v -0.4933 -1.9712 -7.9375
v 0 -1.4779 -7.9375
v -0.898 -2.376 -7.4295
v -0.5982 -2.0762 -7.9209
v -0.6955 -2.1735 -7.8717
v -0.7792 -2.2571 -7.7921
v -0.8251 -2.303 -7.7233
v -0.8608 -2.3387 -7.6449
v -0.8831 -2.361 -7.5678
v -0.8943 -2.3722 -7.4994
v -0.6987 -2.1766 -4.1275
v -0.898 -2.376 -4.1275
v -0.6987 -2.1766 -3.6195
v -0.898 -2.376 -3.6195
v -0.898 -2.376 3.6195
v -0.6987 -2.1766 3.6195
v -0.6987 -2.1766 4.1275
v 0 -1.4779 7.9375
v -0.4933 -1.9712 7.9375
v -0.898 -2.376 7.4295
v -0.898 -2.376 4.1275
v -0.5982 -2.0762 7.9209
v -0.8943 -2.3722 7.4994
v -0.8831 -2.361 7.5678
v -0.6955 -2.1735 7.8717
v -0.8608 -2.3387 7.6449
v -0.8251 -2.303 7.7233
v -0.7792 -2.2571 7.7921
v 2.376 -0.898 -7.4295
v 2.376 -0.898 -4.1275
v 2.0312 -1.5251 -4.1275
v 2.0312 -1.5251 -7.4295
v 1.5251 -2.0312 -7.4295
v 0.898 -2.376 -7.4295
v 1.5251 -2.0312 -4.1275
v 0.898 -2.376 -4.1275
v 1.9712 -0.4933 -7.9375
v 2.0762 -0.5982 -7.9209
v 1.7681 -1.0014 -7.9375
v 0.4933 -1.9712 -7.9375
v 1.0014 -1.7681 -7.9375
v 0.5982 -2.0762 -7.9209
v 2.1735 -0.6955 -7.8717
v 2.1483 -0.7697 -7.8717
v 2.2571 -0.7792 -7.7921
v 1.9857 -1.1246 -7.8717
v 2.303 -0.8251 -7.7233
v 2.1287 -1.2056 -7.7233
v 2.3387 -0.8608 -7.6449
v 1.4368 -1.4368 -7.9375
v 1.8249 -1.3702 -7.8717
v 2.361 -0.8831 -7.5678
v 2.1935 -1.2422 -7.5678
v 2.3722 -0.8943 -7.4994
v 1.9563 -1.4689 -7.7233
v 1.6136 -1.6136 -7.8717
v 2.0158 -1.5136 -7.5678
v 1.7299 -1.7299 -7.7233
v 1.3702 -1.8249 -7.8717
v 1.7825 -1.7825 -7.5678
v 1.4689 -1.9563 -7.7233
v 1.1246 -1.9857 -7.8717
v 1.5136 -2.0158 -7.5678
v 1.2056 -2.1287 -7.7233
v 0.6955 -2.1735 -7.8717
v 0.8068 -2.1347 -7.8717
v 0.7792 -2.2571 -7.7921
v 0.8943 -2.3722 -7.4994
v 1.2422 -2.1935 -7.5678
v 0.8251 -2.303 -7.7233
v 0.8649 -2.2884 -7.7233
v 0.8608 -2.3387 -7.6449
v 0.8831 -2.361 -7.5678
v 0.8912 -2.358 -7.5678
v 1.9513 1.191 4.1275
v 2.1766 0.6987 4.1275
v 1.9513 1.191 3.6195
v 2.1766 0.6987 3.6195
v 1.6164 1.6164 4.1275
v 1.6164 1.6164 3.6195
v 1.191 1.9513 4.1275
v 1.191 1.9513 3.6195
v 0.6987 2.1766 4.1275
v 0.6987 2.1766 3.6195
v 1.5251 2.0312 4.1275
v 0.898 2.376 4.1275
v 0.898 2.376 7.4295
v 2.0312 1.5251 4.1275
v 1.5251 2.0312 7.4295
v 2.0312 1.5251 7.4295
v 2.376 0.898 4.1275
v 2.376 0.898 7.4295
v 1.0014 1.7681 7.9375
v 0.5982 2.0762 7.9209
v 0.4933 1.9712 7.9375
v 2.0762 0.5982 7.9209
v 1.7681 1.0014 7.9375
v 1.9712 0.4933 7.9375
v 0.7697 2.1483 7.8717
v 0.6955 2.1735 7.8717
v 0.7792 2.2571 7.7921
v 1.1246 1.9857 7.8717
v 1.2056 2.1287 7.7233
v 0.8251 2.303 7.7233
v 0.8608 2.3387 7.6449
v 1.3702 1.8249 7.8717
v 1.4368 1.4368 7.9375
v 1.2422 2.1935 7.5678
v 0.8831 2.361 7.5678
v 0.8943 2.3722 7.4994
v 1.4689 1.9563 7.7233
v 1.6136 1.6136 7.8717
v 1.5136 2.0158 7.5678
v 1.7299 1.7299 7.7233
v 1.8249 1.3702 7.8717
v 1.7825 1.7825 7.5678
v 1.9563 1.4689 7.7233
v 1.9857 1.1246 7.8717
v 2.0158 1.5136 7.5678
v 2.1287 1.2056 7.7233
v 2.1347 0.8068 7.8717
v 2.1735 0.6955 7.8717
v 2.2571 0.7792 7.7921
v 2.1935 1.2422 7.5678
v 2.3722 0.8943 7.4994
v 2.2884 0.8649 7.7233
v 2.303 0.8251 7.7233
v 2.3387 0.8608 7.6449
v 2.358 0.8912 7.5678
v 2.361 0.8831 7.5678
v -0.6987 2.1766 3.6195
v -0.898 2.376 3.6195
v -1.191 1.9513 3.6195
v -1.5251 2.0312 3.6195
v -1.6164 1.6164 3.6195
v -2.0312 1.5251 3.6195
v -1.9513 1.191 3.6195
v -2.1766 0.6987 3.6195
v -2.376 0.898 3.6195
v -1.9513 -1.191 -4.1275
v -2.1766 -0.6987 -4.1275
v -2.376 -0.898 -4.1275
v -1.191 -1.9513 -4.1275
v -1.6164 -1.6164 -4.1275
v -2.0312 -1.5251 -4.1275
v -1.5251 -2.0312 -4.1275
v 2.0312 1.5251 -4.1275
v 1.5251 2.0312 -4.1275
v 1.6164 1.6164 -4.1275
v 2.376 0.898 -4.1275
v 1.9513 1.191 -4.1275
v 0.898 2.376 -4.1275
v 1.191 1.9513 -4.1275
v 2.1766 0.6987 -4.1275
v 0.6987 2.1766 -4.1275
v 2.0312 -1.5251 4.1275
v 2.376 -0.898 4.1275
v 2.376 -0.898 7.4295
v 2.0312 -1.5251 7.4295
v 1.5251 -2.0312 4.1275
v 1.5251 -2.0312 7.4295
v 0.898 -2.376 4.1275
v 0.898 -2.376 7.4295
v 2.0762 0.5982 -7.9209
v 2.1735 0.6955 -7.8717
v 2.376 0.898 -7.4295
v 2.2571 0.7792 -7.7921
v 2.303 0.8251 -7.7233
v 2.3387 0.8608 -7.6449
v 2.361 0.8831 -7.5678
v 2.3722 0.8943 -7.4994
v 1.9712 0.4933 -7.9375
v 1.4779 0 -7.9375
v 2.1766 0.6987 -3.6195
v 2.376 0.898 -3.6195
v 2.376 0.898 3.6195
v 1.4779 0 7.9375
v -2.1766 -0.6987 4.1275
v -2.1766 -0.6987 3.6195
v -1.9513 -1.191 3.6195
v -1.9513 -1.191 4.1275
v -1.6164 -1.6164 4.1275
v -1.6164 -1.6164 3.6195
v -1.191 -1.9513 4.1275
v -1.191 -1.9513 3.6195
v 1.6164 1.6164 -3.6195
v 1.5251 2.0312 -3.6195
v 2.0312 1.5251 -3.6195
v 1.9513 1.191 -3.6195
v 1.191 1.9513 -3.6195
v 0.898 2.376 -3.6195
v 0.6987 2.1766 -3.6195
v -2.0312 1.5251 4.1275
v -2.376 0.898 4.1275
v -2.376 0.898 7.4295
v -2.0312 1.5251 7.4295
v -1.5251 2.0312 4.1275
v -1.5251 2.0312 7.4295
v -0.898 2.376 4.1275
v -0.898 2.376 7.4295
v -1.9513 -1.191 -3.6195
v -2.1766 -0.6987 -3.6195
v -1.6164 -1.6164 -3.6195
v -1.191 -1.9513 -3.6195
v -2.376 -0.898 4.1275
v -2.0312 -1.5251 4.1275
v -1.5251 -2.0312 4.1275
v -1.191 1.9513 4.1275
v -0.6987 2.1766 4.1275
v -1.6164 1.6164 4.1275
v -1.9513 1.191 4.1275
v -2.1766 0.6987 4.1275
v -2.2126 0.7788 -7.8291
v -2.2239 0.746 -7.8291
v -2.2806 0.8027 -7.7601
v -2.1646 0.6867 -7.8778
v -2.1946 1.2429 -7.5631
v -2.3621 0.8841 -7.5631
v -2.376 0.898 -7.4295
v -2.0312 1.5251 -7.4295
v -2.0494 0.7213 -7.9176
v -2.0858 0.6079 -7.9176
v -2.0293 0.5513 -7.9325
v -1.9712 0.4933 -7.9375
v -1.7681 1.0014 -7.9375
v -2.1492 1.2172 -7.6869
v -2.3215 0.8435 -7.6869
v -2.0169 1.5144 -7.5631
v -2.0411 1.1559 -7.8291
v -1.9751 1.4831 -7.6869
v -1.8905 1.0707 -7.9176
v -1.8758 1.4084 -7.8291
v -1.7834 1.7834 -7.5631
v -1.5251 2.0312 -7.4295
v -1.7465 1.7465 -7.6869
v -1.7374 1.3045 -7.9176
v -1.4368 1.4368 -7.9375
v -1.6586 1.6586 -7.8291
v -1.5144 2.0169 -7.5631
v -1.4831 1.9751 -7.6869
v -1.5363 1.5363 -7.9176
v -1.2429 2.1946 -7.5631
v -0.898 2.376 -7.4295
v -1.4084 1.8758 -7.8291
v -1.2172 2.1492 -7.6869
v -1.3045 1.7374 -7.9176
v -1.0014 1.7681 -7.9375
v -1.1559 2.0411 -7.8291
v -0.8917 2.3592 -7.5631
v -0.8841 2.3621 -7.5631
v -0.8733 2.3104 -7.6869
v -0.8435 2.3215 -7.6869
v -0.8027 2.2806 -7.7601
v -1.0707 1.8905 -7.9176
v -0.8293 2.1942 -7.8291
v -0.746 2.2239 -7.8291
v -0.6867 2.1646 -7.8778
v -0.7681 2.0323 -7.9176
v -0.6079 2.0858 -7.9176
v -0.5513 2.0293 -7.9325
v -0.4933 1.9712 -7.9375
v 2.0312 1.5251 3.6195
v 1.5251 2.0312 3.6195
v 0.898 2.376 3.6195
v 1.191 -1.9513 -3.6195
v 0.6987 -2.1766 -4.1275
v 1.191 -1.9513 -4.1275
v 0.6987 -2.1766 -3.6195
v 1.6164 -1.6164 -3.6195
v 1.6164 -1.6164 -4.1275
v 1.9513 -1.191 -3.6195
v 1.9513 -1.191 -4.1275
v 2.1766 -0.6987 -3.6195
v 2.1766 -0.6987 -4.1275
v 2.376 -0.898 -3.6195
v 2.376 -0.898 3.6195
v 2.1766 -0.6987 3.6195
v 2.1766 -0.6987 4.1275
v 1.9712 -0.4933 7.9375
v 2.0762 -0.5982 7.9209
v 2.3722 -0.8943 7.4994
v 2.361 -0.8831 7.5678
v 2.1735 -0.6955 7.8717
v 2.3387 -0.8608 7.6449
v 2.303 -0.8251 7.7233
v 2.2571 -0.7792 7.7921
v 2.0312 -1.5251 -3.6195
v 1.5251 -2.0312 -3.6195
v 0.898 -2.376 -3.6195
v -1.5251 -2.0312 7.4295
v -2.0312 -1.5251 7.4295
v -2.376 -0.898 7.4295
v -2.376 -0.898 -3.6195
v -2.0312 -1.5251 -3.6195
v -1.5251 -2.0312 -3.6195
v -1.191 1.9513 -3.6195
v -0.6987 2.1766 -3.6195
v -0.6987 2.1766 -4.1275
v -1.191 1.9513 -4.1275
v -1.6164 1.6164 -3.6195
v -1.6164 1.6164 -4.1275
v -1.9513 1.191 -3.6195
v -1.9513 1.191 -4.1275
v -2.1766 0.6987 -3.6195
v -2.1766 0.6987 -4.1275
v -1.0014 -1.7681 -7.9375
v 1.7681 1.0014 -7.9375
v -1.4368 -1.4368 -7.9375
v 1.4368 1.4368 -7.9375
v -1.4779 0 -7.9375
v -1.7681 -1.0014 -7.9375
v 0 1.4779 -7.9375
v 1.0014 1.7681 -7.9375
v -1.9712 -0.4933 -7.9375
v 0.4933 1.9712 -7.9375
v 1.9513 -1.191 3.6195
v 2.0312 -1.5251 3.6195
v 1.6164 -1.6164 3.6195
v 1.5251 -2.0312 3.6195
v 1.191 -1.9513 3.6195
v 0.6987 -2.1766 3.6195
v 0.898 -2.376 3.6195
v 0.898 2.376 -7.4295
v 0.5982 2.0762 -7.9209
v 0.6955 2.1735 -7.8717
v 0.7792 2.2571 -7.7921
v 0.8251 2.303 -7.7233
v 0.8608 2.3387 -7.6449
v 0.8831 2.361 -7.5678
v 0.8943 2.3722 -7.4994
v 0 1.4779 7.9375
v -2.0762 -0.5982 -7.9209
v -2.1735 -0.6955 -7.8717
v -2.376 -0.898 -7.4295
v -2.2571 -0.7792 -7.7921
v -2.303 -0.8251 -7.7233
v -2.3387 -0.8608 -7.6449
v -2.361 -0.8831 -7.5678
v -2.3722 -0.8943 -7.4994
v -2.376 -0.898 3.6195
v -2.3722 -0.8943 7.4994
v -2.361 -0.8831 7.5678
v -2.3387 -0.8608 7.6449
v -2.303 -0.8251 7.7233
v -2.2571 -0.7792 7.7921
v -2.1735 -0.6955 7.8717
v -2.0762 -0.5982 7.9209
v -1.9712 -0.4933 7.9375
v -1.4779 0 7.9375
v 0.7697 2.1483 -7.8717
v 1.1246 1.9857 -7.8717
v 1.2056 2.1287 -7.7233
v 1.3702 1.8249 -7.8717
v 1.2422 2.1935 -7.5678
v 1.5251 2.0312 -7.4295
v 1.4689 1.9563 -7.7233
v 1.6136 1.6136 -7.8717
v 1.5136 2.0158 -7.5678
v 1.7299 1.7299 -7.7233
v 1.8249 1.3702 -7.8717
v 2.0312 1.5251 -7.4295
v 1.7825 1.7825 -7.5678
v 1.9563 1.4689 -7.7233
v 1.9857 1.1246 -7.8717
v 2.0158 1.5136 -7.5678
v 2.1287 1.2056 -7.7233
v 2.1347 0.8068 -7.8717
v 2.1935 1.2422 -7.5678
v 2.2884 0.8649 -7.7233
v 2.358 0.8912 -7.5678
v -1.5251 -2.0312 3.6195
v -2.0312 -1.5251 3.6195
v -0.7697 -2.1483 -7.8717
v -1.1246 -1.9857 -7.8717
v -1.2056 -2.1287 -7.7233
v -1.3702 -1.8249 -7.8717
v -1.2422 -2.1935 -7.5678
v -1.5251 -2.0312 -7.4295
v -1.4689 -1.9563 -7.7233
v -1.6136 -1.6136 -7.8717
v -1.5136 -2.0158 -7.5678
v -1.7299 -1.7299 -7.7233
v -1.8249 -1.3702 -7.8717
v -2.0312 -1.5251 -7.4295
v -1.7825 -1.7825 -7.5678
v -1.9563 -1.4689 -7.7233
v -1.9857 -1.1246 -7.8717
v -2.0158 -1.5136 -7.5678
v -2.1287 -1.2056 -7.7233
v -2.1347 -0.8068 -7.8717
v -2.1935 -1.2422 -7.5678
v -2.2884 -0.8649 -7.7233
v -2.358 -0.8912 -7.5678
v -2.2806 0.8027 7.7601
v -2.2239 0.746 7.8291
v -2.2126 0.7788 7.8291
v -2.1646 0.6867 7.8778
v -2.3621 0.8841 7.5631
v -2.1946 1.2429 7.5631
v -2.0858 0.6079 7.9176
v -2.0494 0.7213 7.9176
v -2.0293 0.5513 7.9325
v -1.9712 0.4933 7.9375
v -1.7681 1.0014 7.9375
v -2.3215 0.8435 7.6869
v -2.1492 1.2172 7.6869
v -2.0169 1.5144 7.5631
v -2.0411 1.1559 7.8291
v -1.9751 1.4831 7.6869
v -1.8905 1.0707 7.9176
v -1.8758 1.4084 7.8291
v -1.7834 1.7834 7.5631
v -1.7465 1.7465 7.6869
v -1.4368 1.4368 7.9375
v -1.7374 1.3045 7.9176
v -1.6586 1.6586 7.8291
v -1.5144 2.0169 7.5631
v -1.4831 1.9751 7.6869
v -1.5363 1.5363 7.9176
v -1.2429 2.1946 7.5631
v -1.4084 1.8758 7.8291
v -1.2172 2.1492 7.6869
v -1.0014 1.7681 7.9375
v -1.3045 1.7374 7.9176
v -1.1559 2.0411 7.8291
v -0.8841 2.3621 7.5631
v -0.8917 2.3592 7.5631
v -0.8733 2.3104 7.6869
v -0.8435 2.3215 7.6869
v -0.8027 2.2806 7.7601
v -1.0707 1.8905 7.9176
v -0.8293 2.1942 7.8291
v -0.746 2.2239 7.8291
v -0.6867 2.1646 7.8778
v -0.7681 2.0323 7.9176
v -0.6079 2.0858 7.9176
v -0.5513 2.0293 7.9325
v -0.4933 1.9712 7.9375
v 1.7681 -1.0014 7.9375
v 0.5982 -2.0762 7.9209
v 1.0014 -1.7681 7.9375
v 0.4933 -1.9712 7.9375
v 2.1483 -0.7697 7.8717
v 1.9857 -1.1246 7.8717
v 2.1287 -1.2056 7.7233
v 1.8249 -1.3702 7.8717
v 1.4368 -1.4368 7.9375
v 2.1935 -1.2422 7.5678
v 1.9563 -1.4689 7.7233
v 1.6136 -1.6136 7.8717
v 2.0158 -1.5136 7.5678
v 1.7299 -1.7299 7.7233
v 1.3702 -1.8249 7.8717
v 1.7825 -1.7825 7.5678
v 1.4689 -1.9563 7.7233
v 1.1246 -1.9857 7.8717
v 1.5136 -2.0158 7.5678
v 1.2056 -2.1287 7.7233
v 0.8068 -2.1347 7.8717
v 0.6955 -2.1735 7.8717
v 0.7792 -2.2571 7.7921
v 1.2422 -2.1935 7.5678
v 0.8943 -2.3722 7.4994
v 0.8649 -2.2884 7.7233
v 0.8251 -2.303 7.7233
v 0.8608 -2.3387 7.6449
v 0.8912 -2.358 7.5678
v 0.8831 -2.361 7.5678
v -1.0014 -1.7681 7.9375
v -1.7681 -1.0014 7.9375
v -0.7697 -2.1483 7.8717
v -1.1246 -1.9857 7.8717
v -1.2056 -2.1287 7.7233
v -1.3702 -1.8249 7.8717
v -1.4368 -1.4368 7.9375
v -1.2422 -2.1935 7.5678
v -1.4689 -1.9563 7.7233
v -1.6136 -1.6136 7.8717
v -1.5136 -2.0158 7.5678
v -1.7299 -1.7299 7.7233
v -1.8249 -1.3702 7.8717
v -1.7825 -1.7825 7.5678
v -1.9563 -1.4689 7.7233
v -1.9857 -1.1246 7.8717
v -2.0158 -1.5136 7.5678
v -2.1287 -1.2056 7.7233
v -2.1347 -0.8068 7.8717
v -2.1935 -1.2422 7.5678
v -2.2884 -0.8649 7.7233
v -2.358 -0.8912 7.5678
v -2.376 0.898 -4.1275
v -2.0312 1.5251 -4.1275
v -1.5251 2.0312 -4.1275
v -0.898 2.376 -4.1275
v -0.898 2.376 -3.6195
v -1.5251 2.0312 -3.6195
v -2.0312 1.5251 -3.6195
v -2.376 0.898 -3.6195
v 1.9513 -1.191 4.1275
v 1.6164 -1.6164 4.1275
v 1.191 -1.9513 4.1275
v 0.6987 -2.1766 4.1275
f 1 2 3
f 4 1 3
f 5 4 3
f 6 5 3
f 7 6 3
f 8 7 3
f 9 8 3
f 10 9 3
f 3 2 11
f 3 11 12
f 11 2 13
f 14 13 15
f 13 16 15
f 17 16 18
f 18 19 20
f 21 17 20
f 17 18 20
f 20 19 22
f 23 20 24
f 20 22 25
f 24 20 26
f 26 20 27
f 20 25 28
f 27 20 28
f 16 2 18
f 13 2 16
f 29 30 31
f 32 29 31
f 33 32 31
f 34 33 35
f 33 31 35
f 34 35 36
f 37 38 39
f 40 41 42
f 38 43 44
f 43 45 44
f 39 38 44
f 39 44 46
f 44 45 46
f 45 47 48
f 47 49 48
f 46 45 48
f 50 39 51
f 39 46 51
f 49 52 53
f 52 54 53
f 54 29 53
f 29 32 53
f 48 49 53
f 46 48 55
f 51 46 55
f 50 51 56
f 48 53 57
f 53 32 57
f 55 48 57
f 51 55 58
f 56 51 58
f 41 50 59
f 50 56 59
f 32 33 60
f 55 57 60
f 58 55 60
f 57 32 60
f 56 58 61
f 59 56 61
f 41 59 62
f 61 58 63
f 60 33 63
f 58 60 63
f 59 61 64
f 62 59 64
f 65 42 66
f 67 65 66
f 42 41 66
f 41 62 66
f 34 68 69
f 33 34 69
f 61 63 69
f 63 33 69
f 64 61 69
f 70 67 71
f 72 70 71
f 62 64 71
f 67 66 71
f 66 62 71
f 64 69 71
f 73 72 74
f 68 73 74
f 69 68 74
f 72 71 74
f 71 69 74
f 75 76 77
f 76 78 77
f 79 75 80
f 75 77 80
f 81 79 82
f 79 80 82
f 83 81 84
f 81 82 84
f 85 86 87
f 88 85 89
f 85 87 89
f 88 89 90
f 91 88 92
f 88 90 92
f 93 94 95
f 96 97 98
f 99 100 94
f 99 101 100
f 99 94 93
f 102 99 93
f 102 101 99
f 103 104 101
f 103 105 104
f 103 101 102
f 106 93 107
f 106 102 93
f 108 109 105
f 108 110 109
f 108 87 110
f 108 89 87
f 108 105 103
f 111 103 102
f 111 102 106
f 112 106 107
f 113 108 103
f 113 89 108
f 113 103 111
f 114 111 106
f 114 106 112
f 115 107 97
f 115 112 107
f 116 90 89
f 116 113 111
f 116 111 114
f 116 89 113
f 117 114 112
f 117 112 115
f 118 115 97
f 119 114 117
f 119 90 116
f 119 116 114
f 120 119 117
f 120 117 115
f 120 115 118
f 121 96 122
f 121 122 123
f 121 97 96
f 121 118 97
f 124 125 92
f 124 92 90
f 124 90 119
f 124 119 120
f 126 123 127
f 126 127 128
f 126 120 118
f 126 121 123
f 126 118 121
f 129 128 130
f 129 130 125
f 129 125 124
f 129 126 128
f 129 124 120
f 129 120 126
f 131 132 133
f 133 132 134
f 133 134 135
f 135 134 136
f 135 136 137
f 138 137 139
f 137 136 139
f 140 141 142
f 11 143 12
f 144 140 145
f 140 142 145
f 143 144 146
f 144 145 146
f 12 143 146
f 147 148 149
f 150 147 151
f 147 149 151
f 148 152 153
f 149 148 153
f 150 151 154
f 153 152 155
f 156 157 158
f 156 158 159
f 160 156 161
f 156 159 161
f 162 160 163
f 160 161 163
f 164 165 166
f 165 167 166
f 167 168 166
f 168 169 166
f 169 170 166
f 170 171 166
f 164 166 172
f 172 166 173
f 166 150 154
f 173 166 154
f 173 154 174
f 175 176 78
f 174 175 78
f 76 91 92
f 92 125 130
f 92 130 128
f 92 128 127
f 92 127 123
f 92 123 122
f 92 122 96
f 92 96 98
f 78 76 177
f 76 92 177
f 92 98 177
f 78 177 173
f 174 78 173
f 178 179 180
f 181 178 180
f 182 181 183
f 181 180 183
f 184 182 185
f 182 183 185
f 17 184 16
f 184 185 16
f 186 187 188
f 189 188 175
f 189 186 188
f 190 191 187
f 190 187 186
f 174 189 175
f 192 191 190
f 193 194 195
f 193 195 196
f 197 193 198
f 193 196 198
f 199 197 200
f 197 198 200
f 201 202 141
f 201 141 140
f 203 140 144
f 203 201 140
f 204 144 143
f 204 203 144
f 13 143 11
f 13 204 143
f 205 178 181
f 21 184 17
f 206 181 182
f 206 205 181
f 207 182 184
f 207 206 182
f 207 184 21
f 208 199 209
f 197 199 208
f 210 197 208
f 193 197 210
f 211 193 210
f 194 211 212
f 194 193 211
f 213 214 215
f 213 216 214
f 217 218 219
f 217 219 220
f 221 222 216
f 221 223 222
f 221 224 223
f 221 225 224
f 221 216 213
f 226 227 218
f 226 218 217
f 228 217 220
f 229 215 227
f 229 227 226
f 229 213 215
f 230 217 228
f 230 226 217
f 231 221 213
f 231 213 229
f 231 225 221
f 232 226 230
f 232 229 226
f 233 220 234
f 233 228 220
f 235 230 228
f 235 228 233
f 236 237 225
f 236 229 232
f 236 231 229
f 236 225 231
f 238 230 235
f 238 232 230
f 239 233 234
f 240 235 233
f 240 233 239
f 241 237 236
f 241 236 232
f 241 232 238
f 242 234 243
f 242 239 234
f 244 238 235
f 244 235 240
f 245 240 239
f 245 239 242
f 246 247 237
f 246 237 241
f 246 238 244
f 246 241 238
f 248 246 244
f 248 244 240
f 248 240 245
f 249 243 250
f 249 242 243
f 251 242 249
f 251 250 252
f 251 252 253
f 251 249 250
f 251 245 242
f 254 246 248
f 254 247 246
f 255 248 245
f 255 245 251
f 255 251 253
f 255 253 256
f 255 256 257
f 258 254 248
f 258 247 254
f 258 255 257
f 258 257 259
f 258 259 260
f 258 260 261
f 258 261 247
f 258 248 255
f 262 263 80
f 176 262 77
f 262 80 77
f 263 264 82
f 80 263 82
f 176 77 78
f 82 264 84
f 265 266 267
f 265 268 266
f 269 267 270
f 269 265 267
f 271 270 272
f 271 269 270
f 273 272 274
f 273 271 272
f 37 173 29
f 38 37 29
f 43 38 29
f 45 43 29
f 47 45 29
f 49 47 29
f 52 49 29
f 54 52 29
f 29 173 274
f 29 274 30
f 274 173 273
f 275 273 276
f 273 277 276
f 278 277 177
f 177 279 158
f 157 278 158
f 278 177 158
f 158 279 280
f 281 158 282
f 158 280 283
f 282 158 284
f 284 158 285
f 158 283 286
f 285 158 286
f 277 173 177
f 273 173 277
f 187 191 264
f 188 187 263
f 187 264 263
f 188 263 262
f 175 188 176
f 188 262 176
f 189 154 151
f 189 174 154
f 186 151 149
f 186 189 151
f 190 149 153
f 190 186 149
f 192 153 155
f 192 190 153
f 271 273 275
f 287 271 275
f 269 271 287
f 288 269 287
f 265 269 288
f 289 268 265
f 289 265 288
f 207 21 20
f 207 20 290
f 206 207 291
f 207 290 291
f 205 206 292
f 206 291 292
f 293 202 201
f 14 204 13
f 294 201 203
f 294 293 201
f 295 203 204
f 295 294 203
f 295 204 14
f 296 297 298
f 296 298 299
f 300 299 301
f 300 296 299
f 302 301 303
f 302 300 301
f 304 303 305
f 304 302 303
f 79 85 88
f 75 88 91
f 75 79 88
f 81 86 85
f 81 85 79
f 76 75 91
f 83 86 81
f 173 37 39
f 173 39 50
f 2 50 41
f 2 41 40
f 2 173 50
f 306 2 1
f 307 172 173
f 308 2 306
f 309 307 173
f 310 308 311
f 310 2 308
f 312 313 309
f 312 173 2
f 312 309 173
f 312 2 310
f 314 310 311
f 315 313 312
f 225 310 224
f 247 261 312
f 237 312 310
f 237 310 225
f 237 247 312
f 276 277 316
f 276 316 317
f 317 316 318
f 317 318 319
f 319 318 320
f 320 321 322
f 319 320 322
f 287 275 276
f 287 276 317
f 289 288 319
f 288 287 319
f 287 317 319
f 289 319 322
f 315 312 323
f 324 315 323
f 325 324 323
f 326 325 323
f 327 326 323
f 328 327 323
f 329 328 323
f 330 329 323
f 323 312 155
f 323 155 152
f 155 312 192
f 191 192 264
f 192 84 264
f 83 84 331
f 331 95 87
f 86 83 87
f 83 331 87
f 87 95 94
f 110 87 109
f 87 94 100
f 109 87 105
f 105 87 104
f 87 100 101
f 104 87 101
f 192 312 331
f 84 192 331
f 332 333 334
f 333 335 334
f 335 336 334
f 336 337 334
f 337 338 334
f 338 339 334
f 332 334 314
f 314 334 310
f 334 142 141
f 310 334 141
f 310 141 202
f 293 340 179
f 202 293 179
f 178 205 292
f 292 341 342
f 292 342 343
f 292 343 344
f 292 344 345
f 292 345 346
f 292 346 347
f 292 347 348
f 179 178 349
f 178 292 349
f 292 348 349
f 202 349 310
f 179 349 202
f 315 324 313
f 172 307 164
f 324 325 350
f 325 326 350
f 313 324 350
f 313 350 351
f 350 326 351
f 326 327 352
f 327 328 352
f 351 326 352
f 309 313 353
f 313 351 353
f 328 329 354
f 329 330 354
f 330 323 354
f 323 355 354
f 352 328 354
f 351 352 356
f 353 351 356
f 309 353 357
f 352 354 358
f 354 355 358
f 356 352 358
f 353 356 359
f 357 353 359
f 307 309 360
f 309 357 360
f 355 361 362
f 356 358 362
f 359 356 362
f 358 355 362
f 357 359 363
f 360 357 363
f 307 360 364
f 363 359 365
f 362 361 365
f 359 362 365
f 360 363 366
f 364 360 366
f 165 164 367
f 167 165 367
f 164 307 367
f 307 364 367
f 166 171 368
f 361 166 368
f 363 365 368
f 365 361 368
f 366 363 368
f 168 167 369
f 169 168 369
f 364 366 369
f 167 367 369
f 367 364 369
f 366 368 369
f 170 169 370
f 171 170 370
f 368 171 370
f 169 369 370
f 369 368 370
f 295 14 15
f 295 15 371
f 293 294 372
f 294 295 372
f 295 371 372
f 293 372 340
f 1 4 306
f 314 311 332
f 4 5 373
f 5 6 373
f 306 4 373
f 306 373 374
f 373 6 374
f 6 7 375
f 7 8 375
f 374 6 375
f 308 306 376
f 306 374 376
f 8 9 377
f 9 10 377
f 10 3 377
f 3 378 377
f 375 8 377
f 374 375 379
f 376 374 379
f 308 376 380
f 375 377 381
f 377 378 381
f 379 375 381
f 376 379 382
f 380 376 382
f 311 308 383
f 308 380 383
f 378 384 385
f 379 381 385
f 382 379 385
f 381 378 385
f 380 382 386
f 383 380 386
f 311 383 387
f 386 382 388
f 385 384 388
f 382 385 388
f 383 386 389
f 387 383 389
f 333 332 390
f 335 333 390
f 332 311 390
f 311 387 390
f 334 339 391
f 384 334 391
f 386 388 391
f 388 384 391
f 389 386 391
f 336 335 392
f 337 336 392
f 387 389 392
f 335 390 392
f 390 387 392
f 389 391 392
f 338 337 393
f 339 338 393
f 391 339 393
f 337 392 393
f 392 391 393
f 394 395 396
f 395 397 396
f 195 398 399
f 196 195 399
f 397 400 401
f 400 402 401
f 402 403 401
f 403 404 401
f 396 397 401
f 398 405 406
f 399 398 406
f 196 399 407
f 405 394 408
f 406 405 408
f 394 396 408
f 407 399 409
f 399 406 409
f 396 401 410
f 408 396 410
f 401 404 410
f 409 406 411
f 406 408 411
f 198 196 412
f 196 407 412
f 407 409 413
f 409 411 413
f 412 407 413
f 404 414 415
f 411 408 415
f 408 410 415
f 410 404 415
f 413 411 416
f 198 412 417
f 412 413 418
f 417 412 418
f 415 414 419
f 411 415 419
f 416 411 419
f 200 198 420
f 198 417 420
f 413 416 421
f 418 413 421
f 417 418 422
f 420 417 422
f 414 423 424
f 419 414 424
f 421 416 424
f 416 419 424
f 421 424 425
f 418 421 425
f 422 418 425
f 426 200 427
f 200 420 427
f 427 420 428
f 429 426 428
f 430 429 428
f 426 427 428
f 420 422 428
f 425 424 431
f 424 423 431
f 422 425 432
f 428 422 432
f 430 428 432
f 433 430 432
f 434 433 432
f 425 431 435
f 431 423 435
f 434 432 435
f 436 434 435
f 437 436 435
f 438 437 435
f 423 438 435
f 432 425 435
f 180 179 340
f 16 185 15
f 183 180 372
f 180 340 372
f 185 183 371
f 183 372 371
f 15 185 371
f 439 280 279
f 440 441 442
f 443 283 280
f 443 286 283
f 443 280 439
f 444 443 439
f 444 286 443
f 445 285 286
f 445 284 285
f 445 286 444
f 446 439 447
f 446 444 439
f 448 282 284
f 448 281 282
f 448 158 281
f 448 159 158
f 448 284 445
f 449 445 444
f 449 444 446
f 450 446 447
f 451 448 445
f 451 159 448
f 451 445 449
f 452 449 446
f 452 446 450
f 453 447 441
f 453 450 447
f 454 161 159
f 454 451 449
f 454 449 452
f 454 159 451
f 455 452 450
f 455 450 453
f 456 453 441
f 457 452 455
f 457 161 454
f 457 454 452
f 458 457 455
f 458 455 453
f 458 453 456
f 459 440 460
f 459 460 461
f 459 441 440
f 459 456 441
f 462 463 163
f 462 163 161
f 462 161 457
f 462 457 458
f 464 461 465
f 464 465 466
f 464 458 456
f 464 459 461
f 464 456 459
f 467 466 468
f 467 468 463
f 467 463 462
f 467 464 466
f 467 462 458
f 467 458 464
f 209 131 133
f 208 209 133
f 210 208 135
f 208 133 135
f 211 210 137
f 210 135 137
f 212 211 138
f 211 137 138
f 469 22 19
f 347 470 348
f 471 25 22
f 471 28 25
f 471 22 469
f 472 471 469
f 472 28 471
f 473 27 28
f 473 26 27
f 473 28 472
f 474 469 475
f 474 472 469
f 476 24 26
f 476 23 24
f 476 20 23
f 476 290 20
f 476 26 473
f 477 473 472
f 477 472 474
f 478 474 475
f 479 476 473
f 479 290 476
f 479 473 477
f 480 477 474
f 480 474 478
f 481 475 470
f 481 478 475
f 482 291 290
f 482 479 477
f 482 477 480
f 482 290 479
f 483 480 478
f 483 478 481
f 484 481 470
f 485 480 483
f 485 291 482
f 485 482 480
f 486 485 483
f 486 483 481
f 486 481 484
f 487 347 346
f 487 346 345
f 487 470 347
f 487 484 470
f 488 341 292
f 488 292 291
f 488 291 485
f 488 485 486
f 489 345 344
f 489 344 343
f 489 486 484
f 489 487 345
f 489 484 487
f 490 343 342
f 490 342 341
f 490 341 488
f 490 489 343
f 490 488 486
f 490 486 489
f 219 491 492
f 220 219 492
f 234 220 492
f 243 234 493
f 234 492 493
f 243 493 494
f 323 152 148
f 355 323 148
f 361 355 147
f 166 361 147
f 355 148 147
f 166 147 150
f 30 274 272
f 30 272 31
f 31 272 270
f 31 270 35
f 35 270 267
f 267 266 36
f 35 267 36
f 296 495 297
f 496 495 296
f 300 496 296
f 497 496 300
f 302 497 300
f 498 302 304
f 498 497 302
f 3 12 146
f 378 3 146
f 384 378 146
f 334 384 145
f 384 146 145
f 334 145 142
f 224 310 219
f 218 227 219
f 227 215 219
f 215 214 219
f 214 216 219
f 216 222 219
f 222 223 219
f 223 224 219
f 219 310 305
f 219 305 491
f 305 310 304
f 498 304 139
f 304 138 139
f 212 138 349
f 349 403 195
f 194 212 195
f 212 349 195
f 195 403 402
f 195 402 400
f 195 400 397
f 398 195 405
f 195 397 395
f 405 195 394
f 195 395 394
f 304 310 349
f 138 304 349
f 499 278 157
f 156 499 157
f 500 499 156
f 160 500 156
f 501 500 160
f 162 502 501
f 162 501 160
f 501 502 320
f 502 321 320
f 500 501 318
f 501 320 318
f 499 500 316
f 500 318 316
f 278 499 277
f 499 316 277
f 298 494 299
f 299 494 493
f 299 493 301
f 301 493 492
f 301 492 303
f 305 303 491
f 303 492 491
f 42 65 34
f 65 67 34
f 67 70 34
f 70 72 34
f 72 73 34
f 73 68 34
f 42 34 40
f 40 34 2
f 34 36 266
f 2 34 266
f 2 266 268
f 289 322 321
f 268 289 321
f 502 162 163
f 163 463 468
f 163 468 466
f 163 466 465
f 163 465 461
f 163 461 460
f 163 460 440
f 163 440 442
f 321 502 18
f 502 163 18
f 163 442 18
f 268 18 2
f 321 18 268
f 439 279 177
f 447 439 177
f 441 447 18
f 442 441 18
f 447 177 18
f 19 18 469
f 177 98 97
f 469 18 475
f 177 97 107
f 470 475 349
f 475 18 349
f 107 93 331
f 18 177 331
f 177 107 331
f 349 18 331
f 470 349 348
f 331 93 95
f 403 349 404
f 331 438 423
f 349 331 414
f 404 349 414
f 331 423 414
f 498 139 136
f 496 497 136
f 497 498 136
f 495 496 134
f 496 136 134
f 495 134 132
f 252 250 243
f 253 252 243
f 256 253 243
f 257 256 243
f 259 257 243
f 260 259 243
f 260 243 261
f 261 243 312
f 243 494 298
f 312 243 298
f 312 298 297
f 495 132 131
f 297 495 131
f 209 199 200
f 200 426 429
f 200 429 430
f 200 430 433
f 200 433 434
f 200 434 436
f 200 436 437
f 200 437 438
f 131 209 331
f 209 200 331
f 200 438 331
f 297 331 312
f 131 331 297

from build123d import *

# Parameters (mm, degrees)
BOSS_EXTRUDE1_DEPTH = 7.9375
SKETCH2_W           = 0.508
SKETCH2_H           = 0.254
FILLET3_R           = 0.508


with BuildPart() as part:
    # Sketch1 → Boss-Extrude1 (new body, symmetric)
    with BuildSketch(Plane.XY):
        with BuildLine():
            Line((-0.898025612, 2.375952441), (0, 1.477926828))
            Line((0, 1.477926828), (0.898025612, 2.375952441))
            ThreePointArc((0.898025612, 2.375952441), (1.796051224, 1.796051224), (2.375952441, 0.898025612))
            Line((2.375952441, 0.898025612), (1.477926828, 0))
            Line((1.477926828, 0), (2.375952441, -0.898025612))
            ThreePointArc((2.375952441, -0.898025612), (1.796051224, -1.796051224), (0.898025612, -2.375952441))
            Line((0.898025612, -2.375952441), (0, -1.477926828))
            Line((0, -1.477926828), (-0.898025612, -2.375952441))
            ThreePointArc((-0.898025612, -2.375952441), (-1.796051224, -1.796051224), (-2.375952441, -0.898025612))
            Line((-2.375952441, -0.898025612), (-1.477926828, 0))
            Line((-1.477926828, 0), (-2.375952441, 0.898025612))
            ThreePointArc((-2.375952441, 0.898025612), (-1.796051224, 1.796051224), (-0.898025612, 2.375952441))
        make_face()
    extrude(amount=BOSS_EXTRUDE1_DEPTH, both=True)

    # Sketch2 → Cut-Revolve2 (revolve, cut)
    with BuildSketch(Plane(origin=(0, 0, 0), x_dir=(0, 0, -1), z_dir=(1, 0, 0))):
        with Locations((-3.8735, 2.413)):
            Rectangle(SKETCH2_W, SKETCH2_H)
    cut_revolve2 = revolve(axis=Axis((0, 0, 0), (0, 0, 1)), mode=Mode.SUBTRACT)

    # Mirror1: Cut-Revolve2 across plane
    add(cut_revolve2.mirror(Plane.XY), mode=Mode.SUBTRACT)

    # Fillet3
    fillet3_edges = [part.edges().sort_by_distance(p)[0] for p in [
        (1.796051224, 1.796051224, -7.9375),
        (1.796051224, -1.796051224, -7.9375),
        (-1.796051224, -1.796051224, -7.9375),
        (-1.796051224, 1.796051224, -7.9375),
        (-1.796051224, -1.796051224, 7.9375),
        (1.796051224, -1.796051224, 7.9375),
        (1.796051224, 1.796051224, 7.9375),
        (-1.796051224, 1.796051224, 7.9375),
    ]]
    fillet(fillet3_edges, radius=FILLET3_R)


solid = part.part
